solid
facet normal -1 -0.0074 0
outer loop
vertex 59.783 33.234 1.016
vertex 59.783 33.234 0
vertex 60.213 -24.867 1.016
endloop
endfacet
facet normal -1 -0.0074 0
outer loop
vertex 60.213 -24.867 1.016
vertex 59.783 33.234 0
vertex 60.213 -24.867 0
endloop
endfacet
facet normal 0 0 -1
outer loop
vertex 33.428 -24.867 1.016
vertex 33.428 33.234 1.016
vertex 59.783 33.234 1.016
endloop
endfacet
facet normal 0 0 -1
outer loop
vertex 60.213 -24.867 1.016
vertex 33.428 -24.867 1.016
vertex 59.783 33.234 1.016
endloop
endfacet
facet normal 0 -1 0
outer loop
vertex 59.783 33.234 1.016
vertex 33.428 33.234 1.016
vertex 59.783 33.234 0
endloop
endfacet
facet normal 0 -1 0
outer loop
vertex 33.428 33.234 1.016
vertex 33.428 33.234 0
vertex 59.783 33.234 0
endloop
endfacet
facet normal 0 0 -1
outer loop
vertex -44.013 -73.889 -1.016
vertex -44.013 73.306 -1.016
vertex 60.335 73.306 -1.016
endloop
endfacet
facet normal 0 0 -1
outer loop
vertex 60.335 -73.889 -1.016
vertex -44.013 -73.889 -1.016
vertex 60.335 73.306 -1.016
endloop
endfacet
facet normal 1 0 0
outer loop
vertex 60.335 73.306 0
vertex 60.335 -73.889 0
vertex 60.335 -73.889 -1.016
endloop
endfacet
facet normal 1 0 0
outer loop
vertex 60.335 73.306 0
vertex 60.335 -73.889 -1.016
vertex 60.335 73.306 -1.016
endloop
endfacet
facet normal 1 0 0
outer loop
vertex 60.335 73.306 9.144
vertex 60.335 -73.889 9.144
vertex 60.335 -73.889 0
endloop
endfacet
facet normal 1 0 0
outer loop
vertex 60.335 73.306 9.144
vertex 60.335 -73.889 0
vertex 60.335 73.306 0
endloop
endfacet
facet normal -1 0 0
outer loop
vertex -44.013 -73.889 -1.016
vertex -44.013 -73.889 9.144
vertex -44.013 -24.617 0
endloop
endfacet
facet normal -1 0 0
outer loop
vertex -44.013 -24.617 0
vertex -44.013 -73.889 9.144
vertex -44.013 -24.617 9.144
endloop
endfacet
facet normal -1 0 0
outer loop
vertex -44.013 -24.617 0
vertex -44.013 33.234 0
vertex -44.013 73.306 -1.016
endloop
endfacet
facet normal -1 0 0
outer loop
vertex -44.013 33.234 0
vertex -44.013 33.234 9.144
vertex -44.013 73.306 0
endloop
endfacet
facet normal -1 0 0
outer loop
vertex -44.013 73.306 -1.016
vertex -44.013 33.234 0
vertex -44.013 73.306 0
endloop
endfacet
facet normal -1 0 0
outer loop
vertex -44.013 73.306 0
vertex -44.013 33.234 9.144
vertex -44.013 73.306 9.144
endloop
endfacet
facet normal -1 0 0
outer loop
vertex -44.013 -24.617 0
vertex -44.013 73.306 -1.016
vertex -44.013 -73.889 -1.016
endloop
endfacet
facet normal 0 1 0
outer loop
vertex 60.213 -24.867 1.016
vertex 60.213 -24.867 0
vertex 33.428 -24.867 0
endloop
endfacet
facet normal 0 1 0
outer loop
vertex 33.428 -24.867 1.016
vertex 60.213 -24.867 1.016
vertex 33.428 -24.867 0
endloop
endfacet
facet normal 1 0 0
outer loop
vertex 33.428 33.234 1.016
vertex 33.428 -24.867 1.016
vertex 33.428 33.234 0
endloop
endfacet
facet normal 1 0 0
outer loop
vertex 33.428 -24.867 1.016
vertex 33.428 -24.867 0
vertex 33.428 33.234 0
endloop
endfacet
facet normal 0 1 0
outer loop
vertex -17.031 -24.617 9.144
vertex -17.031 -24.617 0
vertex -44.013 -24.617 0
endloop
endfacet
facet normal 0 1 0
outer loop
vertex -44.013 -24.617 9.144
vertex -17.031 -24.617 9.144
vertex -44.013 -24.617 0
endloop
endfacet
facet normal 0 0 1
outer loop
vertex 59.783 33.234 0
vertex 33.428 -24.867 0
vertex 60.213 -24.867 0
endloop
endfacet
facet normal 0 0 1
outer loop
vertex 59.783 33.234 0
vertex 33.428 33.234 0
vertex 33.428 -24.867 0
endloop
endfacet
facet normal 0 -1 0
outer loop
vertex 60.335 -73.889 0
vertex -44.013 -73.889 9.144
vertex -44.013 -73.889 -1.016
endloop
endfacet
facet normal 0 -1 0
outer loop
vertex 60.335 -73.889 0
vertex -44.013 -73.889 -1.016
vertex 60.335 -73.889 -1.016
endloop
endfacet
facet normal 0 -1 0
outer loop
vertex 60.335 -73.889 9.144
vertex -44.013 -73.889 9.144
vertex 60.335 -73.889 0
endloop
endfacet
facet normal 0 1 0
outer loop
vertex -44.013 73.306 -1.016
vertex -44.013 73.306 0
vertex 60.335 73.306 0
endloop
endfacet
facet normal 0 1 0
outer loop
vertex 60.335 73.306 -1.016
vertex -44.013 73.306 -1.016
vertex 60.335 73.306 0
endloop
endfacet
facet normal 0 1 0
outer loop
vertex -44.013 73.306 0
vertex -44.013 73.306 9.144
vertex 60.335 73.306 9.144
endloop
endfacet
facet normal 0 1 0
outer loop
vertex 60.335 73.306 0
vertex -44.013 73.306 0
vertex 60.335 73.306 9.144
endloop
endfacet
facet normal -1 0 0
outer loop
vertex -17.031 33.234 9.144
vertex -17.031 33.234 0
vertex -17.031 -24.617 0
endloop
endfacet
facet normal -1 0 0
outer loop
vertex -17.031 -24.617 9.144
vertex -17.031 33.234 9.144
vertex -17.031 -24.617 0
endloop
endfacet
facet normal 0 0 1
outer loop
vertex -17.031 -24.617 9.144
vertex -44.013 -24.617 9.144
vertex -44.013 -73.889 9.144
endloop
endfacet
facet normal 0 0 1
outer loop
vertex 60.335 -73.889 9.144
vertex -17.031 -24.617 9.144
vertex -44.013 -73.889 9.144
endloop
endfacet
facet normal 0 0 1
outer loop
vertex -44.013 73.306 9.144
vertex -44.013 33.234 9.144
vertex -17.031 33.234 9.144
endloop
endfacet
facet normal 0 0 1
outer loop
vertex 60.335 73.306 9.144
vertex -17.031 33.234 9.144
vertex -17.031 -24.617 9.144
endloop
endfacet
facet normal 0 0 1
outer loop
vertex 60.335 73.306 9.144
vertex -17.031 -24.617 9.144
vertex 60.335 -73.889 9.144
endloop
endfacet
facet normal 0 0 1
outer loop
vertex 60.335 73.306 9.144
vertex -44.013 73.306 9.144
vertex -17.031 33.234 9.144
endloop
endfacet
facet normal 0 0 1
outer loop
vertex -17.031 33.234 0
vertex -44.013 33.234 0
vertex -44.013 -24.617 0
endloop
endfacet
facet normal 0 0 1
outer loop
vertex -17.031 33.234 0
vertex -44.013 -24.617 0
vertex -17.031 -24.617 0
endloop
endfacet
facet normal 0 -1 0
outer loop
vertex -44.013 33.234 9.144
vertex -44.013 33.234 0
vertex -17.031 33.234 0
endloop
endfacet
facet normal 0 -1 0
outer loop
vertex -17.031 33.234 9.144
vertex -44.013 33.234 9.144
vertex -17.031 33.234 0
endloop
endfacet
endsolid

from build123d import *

# Parameters (mm, degrees)
F2_DEPTH = 9.144
F0_W     = 104.3482013047
F0_H     = 147.1950858831
F3_DEPTH = 1.016
F5_DEPTH = 8.128


with BuildPart() as f2:
    # F1 (on face) → F2 (new body)
    with BuildSketch(Plane.XY):
        Polygon((-44.0127886832, 33.2340672612), (-17.0306321234, 33.2340672612), (-17.0306321234, -24.6169902384), (-44.0127886832, -24.6169902384), (-44.0127886832, -73.8890171051), (60.3354126215, -73.8890171051), (60.3354126215, 73.306068778), (-44.0127886832, 73.306068778), align=None)
        Polygon((33.4283486009, -24.867111817), (33.4283486009, 33.2340672612), (59.7827173769, 33.2340672612), (60.2132864296, -24.867111817), align=None, mode=Mode.SUBTRACT)
    extrude(amount=F2_DEPTH)

    # F0 (on Top) + F2_face (on face) → F3 (join)
    with BuildSketch(Plane.XY):
        with Locations((8.1613119692, -0.2914741635)):
            Rectangle(F0_W, F0_H)
    with BuildSketch(Plane(origin=(8.2321469679, -1.4312137142, 9.144), x_dir=(1, 0, 0), z_dir=(0, 0, 1))):
        Polygon((-52.2449356511, 34.6652809755), (-25.2627790912, 34.6652809755), (-25.2627790912, -23.1857765242), (-52.2449356511, -23.1857765242), (-52.2449356511, -72.4578033909), (52.1032656536, -72.4578033909), (52.1032656536, 74.7372824923), (-52.2449356511, 74.7372824923), align=None)
        Polygon((51.9811394618, -23.4358981028), (25.196201633, -23.4358981028), (25.196201633, 34.6652809755), (51.5505704091, 34.6652809755), align=None, mode=Mode.SUBTRACT)
    extrude(amount=-F3_DEPTH)

    # F4 (on face) → F5 (join)
    with BuildSketch(Plane.XY.offset(9.144)):
        Polygon((59.7827173769, 33.2340672612), (33.4283486009, 33.2340672612), (33.4283486009, -24.867111817), (60.2132864296, -24.867111817), align=None)
    extrude(amount=-F5_DEPTH)


solid = f2.part
